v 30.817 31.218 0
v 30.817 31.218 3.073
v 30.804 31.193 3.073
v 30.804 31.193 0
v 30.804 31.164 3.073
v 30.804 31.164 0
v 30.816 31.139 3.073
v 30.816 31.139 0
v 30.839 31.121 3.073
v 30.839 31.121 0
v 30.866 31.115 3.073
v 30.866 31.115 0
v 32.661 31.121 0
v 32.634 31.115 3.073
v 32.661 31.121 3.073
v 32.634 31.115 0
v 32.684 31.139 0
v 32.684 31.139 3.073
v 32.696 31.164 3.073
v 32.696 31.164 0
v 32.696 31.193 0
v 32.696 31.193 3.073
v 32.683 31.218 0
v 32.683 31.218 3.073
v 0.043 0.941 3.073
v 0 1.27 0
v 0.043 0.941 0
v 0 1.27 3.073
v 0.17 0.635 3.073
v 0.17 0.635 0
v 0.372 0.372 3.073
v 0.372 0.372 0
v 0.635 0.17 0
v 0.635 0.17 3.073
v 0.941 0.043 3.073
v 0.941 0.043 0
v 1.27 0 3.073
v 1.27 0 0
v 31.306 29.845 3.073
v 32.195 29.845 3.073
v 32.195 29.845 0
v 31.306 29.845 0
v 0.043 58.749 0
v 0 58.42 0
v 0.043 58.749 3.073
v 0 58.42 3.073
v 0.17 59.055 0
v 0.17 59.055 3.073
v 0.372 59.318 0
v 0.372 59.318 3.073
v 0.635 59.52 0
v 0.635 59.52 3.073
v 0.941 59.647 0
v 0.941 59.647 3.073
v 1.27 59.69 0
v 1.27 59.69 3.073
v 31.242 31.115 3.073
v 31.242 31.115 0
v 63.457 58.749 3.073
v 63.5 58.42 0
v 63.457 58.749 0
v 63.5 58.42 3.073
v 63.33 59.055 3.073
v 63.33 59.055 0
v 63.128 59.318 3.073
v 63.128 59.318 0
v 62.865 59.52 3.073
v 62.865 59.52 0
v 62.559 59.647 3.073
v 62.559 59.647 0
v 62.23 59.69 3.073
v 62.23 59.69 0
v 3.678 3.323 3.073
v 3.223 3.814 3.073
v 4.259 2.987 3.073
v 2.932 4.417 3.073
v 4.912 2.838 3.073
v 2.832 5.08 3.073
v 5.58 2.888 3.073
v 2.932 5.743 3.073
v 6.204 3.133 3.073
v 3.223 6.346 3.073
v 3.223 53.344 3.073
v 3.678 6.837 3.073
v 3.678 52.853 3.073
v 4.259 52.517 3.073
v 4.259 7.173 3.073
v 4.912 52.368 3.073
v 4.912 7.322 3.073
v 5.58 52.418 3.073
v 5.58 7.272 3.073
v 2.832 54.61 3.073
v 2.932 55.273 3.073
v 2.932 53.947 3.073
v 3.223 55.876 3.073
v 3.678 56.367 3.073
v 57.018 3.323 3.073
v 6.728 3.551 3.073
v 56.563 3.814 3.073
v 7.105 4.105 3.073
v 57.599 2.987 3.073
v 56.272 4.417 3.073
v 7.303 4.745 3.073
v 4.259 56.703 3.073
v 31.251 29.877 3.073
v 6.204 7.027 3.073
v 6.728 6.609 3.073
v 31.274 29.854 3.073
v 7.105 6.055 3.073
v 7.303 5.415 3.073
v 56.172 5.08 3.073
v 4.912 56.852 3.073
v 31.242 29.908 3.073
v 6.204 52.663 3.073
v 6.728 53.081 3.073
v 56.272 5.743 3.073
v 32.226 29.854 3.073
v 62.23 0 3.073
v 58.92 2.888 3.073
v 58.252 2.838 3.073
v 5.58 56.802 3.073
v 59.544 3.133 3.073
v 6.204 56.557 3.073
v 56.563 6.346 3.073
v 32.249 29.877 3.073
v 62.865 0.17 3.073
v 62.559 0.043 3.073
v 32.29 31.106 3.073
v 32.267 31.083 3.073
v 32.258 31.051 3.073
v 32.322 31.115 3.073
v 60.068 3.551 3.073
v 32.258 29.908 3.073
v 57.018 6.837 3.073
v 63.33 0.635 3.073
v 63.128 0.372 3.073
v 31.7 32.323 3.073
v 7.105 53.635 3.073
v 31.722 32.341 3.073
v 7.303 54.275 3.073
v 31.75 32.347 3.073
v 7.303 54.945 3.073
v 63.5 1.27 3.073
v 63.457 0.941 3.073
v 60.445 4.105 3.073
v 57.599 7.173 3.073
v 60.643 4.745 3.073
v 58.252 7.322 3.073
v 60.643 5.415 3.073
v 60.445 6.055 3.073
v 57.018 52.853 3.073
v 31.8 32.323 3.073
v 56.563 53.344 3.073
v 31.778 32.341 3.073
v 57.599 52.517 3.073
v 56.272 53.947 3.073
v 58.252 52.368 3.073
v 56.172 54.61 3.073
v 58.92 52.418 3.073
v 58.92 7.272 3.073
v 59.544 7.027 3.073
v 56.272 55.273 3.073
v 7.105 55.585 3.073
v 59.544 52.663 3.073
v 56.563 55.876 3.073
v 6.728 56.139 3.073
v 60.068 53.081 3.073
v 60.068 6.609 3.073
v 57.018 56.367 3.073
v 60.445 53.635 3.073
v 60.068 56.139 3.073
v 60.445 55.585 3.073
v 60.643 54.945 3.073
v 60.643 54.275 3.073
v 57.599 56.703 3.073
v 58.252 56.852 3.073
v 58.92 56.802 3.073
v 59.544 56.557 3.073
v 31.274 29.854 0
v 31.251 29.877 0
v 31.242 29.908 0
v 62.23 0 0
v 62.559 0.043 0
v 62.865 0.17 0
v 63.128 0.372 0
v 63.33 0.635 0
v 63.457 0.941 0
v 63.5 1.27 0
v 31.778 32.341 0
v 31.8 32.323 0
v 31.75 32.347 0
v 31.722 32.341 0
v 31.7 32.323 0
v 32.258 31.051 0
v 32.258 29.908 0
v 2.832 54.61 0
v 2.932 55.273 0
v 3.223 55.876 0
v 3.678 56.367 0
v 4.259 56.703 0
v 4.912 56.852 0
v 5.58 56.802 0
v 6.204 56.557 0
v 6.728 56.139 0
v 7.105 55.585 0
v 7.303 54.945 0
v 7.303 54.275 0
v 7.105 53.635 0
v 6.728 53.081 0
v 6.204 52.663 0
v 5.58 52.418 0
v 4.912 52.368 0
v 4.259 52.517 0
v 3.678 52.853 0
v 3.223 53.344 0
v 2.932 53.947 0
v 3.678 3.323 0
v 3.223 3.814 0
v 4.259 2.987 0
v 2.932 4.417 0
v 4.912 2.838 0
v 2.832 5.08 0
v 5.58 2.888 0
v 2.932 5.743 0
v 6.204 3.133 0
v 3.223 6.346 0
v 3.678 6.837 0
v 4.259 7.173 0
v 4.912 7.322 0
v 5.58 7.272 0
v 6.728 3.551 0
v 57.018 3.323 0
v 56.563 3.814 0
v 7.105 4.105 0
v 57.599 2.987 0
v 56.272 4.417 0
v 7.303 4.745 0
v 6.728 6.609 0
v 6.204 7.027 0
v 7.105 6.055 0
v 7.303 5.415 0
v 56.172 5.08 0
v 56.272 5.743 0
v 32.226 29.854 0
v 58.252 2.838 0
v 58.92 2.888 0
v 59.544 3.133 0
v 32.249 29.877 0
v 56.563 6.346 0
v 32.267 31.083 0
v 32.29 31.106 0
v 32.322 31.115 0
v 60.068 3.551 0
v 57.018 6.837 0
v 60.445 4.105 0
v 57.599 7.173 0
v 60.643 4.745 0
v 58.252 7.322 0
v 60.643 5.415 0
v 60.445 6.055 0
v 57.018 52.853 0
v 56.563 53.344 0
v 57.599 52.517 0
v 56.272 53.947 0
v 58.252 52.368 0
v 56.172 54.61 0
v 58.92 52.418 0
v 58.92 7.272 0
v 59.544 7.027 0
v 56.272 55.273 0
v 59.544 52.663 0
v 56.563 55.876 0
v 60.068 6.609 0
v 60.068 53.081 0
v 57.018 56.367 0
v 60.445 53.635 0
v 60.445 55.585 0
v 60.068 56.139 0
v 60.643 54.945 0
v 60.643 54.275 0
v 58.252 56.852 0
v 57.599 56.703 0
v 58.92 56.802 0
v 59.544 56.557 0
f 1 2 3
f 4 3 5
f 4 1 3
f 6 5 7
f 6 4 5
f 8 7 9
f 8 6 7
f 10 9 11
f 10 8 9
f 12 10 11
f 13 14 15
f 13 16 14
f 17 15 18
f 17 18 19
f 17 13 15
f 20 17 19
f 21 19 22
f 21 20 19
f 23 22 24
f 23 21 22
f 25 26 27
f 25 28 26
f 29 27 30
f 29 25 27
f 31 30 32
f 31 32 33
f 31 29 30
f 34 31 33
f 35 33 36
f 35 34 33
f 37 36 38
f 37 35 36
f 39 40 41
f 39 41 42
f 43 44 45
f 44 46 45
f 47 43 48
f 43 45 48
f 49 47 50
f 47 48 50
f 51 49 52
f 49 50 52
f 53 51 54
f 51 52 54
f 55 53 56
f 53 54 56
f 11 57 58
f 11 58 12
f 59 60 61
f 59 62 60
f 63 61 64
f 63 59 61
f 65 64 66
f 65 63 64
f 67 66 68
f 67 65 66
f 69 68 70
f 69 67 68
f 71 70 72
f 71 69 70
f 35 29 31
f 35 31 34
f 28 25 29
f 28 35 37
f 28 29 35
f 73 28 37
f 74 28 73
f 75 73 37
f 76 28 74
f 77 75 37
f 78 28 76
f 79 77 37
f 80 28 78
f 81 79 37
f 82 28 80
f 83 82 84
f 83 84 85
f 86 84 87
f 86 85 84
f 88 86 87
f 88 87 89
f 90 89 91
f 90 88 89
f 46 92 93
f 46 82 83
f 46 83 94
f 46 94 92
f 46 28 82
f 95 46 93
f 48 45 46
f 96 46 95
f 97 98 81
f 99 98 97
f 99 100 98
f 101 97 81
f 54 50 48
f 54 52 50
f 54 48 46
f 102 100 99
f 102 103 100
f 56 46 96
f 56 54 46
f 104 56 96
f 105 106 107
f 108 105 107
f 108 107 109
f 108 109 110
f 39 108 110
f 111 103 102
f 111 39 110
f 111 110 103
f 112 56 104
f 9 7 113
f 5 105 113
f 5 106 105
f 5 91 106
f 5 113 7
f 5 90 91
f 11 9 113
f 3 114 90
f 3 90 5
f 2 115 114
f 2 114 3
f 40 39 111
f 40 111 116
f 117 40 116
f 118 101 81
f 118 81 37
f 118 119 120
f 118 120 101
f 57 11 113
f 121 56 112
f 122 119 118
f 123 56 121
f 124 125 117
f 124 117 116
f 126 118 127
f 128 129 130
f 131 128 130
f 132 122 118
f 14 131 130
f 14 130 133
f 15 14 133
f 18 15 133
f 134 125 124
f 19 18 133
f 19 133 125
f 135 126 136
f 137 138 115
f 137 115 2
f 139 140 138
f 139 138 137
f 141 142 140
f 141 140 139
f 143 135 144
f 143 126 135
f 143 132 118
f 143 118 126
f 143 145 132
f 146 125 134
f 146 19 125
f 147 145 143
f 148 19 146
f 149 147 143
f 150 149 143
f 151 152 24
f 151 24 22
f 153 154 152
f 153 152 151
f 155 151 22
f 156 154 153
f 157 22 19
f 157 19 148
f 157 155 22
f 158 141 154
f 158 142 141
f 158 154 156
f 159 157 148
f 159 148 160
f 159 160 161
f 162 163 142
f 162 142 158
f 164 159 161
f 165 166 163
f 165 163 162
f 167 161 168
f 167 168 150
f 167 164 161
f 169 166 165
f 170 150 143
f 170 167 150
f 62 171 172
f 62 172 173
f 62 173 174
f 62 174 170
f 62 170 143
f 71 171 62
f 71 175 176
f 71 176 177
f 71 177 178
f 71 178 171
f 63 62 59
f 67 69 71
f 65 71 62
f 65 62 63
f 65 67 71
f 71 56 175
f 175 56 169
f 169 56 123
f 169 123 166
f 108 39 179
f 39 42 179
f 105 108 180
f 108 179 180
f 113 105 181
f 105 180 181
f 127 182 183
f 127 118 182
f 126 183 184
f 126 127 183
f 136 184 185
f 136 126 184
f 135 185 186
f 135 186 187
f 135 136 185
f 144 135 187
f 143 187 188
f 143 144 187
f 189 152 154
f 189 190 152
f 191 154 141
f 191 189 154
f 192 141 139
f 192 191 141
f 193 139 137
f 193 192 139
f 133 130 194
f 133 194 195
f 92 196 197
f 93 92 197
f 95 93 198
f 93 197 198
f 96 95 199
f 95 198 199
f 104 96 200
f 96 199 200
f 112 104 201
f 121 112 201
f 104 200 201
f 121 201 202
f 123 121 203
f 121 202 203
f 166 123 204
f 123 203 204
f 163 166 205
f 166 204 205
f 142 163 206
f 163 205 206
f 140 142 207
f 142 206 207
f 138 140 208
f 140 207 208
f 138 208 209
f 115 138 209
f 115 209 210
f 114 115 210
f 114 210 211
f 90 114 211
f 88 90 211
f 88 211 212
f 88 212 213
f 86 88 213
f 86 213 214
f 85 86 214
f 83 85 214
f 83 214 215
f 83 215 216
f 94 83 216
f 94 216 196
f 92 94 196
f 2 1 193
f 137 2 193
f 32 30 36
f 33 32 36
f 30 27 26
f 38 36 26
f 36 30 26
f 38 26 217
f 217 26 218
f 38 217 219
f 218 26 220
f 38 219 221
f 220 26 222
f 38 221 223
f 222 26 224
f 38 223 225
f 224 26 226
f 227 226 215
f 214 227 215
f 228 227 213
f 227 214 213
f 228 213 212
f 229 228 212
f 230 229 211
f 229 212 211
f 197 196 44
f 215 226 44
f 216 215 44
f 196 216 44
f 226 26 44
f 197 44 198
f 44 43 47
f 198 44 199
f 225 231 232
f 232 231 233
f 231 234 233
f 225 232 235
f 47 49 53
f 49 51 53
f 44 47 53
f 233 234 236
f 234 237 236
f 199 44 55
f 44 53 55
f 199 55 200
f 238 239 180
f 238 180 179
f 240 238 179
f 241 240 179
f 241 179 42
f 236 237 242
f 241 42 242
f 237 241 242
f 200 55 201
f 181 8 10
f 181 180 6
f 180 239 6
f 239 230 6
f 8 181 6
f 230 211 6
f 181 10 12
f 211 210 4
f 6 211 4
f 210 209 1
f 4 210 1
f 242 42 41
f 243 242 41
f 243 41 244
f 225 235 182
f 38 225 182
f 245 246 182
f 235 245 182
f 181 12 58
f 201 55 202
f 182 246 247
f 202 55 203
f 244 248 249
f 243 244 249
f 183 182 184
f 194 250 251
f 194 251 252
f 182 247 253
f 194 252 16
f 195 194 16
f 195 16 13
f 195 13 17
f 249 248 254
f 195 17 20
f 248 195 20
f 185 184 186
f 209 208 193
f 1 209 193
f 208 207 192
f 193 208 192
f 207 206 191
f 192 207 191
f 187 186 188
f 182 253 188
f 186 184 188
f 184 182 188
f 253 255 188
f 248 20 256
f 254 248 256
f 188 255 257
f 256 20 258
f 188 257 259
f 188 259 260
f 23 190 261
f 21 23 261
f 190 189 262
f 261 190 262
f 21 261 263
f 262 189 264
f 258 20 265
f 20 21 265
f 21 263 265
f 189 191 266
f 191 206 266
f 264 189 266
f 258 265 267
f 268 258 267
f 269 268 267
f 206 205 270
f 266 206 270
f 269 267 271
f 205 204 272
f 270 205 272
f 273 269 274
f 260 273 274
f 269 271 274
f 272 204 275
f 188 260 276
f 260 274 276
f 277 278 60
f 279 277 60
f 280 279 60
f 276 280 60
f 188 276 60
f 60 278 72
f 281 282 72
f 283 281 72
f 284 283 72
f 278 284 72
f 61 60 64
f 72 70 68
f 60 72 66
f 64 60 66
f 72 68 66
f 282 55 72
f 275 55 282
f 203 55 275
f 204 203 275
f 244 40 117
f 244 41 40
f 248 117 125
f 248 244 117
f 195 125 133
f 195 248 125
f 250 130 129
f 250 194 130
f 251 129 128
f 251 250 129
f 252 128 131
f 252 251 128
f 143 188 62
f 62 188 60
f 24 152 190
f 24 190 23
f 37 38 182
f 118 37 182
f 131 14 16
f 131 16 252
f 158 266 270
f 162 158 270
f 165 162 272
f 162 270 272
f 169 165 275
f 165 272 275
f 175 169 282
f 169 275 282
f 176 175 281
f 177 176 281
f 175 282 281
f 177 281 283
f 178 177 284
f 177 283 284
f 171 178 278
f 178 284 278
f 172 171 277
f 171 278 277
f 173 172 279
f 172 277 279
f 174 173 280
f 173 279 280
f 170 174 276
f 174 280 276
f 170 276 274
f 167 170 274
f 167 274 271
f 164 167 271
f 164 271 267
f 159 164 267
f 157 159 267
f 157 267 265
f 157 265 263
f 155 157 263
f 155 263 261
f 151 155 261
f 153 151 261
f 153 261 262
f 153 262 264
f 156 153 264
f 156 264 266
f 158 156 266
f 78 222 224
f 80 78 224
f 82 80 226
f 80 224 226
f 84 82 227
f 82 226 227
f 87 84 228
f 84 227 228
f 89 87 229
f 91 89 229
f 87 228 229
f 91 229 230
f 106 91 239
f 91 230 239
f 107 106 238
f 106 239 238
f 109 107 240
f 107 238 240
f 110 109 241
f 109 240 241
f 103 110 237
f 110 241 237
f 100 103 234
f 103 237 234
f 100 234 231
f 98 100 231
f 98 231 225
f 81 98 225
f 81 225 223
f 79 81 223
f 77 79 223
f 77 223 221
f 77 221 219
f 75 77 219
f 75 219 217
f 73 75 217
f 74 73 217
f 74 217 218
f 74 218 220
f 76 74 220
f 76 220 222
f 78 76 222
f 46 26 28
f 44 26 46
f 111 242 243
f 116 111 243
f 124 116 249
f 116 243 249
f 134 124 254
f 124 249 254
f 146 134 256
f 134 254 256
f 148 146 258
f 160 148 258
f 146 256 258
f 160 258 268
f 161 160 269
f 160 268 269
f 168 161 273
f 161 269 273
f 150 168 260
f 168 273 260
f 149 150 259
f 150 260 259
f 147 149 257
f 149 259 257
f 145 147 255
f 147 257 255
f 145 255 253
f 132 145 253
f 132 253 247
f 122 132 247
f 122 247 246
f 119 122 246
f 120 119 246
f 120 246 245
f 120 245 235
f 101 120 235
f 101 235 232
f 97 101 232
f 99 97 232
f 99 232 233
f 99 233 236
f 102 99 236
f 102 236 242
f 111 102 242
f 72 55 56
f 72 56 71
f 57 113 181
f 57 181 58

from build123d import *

# Parameters (mm, degrees)
SKETCH1_W             = 63.5
SKETCH1_H             = 59.69
BOSS_EXTRUDE1_DEPTH   = 3.0734
FILLET1_R             = 1.27
F_8_CLEARANCE_HOLE1_D = 4.4958
CUT_EXTRUDE1_DEPTH    = 4.0734
FILLET2_R             = 0.0635


with BuildPart() as part:
    # Sketch1 → Boss-Extrude1 (new body)
    with BuildSketch(Plane.XY):
        with Locations((31.75, 29.845)):
            Rectangle(SKETCH1_W, SKETCH1_H)
    extrude(amount=BOSS_EXTRUDE1_DEPTH)

    # Fillet1
    fillet1_edges = [part.edges().sort_by_distance(p)[0] for p in [
        (0, 59.69, 1.5367),
        (63.5, 59.69, 1.5367),
        (63.5, 0, 1.5367),
        (0, 0, 1.5367),
    ]]
    fillet(fillet1_edges, radius=FILLET1_R)

    # #8 Clearance Hole1 (through all)
    with Locations(Plane.XY.offset(3.0734)):
        with Locations((5.08, 54.61), (58.42, 54.61), (58.42, 5.08), (5.08, 5.08)):
            Hole(F_8_CLEARANCE_HOLE1_D / 2)

    # Sketch7 → Cut-Extrude1 (cut, through all)
    with BuildSketch(Plane.XY.offset(3.0734)):
        Polygon((31.242, 29.845), (31.242, 31.115), (30.734, 31.115), (31.75, 32.385), (32.766, 31.115), (32.258, 31.115), (32.258, 29.845), align=None)
    extrude(amount=-CUT_EXTRUDE1_DEPTH, mode=Mode.SUBTRACT)

    # Fillet2
    fillet2_edges = [part.edges().sort_by_distance(p)[0] for p in [
        (32.258, 29.845, 1.5367),
        (31.242, 29.845, 1.5367),
        (30.734, 31.115, 1.5367),
        (31.75, 32.385, 1.5367),
        (32.766, 31.115, 1.5367),
        (32.258, 31.115, 1.5367),
    ]]
    fillet(fillet2_edges, radius=FILLET2_R)


solid = part.part
